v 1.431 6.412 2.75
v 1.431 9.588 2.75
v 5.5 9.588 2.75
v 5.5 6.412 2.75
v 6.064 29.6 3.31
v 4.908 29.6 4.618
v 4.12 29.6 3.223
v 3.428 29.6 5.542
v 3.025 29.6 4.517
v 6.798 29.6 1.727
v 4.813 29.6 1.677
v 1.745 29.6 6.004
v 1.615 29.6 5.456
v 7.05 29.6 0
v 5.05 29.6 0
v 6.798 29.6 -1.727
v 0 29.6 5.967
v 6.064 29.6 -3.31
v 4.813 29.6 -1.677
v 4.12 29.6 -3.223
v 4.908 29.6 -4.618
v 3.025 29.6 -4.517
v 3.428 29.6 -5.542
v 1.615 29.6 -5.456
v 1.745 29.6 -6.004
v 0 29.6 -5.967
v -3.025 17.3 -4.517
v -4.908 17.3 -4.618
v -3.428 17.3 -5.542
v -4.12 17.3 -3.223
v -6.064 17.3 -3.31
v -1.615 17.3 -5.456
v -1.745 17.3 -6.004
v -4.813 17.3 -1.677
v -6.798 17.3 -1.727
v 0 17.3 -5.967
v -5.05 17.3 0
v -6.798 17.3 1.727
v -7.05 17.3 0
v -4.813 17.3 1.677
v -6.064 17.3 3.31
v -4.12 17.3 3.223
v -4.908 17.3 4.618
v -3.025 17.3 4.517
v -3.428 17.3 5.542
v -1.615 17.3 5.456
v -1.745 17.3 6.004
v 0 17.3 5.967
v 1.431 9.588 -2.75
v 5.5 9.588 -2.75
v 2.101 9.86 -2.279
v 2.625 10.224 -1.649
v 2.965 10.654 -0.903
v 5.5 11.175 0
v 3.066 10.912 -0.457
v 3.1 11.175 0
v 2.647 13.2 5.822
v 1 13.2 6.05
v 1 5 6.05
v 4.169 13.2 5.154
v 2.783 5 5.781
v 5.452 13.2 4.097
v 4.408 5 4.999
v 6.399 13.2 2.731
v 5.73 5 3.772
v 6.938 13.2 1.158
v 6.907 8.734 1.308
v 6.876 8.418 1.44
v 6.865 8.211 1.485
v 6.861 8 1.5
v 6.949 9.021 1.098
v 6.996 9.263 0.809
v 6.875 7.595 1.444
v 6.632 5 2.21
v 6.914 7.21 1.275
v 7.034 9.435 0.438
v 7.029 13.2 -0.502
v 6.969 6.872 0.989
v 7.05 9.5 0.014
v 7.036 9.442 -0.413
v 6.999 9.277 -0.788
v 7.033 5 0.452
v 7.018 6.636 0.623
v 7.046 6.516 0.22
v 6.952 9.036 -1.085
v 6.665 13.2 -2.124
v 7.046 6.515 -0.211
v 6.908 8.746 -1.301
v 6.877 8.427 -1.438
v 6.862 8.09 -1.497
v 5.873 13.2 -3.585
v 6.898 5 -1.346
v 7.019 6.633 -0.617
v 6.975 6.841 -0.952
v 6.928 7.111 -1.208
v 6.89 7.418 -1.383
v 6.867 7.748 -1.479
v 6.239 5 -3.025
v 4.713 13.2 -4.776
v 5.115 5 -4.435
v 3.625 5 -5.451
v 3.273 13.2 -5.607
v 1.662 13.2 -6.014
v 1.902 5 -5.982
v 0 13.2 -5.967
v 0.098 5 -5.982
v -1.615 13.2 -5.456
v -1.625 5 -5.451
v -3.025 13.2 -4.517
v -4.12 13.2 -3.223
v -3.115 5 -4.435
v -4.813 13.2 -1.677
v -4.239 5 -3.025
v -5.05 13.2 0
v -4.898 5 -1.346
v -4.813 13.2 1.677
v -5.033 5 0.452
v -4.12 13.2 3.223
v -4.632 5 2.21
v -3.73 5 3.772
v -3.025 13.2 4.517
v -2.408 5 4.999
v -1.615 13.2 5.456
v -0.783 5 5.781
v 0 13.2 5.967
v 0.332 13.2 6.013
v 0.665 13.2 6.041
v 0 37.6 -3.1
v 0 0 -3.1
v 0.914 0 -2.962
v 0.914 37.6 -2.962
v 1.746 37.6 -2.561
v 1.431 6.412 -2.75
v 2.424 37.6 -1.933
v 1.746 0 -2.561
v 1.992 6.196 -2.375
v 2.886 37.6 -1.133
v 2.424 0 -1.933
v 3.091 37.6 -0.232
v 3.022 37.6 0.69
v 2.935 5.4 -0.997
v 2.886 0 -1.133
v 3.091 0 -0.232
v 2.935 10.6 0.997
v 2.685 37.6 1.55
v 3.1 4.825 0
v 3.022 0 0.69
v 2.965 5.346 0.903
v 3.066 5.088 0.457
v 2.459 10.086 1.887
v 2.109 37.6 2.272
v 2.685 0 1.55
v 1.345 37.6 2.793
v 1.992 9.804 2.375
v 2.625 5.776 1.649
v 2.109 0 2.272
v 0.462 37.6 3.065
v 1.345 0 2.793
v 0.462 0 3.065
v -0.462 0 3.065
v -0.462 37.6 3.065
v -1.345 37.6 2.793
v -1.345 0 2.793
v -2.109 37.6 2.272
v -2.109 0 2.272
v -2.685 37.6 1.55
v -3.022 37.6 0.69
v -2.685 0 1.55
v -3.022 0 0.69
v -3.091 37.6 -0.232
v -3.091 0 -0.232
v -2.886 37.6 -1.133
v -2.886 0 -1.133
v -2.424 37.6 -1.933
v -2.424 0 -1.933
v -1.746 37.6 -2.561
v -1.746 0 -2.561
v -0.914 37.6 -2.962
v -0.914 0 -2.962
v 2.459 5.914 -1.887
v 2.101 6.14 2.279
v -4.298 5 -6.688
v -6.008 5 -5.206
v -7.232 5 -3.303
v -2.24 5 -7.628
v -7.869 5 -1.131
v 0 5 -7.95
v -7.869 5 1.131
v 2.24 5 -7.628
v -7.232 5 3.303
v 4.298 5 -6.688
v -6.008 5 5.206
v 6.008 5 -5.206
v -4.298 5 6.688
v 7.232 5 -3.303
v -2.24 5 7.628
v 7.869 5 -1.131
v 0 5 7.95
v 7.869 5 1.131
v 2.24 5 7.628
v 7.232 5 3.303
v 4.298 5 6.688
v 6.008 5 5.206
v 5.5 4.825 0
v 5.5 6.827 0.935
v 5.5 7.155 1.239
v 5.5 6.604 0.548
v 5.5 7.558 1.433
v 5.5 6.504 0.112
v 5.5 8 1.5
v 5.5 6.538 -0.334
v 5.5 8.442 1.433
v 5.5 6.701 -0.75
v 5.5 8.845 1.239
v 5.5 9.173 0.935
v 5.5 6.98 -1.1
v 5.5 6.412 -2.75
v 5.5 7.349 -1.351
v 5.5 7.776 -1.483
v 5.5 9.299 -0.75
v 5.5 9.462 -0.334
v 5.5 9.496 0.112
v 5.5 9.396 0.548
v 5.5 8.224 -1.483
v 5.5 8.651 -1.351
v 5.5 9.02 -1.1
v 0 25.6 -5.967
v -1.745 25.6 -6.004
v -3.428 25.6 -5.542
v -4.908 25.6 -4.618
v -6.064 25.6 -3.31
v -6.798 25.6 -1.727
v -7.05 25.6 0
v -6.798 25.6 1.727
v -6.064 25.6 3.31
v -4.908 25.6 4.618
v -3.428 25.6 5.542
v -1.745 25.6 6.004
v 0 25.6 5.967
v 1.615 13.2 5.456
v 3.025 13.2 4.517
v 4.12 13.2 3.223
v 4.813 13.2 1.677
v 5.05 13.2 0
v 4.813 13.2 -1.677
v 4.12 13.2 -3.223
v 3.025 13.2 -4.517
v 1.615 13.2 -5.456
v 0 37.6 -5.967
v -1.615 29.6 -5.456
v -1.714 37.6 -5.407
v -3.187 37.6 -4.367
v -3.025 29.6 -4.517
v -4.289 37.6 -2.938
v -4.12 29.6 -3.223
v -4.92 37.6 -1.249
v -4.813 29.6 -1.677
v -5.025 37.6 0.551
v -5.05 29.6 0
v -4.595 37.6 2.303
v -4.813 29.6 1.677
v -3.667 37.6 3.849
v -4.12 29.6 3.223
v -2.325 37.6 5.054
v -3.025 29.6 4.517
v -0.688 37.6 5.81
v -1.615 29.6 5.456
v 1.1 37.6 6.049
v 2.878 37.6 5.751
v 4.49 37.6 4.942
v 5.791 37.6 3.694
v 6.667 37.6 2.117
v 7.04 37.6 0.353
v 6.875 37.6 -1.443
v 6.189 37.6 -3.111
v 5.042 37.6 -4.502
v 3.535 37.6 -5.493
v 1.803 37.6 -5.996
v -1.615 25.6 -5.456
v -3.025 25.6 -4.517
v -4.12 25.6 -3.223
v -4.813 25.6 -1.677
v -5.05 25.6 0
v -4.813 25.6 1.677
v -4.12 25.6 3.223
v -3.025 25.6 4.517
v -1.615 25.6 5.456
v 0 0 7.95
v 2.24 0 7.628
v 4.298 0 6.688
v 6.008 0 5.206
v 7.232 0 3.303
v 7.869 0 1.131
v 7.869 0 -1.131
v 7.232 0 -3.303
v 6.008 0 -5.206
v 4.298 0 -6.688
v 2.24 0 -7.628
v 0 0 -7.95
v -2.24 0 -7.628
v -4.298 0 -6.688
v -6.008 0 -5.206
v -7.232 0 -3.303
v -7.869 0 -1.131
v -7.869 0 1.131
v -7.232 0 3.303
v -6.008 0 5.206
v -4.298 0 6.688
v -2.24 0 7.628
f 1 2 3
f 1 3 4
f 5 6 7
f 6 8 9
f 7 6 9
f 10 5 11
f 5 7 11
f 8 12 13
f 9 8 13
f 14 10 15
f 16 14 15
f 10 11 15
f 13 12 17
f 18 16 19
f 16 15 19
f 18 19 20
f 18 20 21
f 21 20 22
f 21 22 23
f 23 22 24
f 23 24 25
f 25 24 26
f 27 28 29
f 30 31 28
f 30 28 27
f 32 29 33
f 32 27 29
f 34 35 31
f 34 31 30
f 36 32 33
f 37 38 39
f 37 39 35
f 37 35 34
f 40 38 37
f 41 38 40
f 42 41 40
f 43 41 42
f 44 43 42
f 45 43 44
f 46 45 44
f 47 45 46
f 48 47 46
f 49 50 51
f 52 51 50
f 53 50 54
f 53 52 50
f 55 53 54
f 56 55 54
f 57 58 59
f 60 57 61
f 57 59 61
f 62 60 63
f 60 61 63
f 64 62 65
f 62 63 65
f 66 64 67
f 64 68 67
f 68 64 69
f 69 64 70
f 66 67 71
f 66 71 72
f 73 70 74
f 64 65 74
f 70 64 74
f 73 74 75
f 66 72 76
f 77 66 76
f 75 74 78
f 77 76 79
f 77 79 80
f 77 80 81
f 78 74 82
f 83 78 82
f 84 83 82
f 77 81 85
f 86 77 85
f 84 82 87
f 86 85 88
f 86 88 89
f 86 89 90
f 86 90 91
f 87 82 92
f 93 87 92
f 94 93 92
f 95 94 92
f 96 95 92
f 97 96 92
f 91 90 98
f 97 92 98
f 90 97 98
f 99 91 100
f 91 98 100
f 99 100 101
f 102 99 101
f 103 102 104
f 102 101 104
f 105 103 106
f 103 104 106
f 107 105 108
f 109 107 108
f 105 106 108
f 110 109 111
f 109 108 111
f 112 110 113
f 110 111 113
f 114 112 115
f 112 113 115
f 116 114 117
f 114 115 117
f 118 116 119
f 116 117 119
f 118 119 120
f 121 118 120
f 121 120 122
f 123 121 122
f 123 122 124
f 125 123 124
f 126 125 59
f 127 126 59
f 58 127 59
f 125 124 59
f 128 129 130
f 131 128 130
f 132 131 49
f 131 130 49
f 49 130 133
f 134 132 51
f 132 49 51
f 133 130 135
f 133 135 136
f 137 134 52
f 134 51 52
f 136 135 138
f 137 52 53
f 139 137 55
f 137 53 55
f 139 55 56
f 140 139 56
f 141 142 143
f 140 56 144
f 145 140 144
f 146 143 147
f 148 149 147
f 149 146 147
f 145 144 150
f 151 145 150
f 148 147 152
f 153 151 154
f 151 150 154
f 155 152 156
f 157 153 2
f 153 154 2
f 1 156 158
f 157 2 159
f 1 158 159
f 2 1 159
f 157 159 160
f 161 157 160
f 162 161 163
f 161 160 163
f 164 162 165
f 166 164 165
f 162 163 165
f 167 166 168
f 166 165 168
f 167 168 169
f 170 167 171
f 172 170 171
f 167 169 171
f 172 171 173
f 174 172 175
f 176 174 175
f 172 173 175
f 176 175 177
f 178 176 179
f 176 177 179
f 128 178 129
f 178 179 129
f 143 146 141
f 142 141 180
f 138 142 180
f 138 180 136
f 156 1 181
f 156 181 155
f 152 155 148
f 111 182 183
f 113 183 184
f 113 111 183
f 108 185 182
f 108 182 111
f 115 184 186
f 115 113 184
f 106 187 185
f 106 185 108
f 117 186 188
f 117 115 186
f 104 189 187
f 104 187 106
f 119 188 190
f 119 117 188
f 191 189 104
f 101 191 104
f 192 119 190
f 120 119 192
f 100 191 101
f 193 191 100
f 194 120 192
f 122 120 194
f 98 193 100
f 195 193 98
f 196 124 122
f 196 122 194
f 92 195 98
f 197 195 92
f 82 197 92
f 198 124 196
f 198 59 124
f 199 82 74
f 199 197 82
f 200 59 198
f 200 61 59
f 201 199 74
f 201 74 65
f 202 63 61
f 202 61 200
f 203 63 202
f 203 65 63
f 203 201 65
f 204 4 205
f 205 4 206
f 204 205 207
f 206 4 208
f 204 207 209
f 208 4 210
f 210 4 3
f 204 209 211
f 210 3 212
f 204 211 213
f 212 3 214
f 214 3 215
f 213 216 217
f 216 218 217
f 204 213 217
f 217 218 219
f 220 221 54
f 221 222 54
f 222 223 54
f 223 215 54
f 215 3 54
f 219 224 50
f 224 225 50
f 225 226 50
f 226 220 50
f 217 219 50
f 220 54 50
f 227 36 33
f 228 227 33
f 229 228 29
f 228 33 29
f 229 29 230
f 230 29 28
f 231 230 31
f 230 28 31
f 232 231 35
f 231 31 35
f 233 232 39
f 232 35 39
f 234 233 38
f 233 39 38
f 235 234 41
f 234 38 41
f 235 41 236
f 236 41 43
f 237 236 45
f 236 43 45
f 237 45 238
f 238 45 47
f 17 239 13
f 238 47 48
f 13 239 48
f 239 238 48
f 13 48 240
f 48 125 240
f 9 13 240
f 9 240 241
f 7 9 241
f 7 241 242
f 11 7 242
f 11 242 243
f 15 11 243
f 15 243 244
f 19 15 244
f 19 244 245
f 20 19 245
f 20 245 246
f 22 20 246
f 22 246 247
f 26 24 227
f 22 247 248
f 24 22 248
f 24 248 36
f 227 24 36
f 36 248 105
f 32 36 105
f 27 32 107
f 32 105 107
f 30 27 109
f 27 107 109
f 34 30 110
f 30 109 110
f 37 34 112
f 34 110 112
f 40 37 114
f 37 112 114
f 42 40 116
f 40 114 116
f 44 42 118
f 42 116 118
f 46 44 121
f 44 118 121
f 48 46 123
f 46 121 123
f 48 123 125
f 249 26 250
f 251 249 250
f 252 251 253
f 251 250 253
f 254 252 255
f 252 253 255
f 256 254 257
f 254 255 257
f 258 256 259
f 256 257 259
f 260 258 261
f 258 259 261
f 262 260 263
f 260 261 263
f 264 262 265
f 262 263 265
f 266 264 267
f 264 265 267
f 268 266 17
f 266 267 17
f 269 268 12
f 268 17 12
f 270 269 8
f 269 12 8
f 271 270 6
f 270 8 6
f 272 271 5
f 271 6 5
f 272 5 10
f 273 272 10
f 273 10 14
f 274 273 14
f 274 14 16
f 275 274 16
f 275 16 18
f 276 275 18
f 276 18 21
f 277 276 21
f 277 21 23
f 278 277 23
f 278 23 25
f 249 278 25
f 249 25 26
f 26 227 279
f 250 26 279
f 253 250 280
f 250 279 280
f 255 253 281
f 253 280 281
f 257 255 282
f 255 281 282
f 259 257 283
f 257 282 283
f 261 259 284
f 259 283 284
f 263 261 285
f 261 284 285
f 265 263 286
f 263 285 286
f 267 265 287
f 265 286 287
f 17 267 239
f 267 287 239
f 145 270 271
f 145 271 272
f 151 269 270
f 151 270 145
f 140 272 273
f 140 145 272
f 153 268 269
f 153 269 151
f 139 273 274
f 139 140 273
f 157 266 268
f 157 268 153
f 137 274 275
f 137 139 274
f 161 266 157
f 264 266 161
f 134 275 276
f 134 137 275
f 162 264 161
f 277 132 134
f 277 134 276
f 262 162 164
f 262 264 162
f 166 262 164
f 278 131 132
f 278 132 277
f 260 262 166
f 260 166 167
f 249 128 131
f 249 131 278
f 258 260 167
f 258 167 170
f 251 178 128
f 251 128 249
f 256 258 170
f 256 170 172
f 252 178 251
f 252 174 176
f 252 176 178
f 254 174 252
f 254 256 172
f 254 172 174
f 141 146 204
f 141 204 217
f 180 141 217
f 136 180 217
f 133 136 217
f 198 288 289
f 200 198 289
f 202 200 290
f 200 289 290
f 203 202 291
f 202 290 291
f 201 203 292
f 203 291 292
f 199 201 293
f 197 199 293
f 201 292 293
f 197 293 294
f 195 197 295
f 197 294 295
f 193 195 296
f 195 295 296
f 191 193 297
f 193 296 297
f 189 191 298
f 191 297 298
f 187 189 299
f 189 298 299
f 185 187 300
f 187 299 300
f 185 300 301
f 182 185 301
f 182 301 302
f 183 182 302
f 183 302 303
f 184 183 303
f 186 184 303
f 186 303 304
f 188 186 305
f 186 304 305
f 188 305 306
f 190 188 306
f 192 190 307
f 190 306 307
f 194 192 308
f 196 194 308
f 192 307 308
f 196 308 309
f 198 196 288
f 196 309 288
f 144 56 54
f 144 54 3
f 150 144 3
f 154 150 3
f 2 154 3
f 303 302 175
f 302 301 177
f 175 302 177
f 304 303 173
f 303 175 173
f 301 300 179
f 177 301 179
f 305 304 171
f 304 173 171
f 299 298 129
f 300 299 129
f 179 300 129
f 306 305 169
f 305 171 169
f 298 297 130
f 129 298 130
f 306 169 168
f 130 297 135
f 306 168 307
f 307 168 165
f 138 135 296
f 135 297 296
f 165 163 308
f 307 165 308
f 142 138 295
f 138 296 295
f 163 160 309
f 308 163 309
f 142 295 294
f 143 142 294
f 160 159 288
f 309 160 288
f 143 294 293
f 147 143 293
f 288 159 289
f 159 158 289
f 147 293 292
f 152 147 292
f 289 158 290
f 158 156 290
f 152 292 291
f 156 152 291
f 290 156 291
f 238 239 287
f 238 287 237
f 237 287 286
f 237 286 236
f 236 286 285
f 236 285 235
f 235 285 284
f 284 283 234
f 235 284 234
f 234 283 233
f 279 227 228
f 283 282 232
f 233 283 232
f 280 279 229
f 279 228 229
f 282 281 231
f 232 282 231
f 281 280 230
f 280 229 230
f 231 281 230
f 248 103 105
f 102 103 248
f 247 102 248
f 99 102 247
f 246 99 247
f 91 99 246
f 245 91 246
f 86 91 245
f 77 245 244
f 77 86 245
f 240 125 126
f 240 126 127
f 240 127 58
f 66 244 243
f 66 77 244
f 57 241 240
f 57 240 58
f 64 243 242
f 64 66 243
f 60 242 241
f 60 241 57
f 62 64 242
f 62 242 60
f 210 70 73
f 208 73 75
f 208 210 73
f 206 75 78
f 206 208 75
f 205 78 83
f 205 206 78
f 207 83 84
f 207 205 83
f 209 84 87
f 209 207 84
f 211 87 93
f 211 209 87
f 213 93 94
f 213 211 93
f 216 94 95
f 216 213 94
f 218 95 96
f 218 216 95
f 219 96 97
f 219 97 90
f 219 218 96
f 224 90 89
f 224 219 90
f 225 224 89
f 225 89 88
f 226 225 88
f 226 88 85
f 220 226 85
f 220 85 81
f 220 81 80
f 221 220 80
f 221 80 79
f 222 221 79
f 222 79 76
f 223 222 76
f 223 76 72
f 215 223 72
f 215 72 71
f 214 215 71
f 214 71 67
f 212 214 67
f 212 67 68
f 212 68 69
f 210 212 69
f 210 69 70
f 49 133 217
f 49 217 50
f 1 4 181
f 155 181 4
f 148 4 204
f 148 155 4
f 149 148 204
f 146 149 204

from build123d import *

# Parameters (mm, degrees)
SKETCH1_R           = 7.95
BOSS_EXTRUDE1_DEPTH = 5
SKETCH2_R           = 6.05
BOSS_EXTRUDE2_DEPTH = 8.2
SKETCH3_R           = 6.05
BOSS_EXTRUDE3_DEPTH = 16.4
CUT_EXTRUDE1_DEPTH  = 4.1
SKETCH5_R           = 6.05
BOSS_EXTRUDE4_DEPTH = 8
CUT_EXTRUDE2_START  = -4
CUT_EXTRUDE2_DEPTH  = 4
SKETCH7_R           = 3.1
CUT_EXTRUDE3_DEPTH  = 40.244935979
SKETCH8_R           = 1.5
CUT_EXTRUDE4_DEPTH  = 40.244935979
SKETCH9_R           = 1.5
CUT_EXTRUDE5_DEPTH  = 5.5


with BuildPart() as part:
    # Sketch1 → Boss-Extrude1 (new body)
    with BuildSketch(Plane(origin=(0, 0, 0), x_dir=(1, 0, 0), z_dir=(0, 1, 0))):
        with Locations(Location((0, 0, 0), (0, 0, 270))):
            Circle(SKETCH1_R)
    extrude(amount=BOSS_EXTRUDE1_DEPTH)

    # Sketch2 → Boss-Extrude2 (add)
    with BuildSketch(Plane(origin=(0, 5, 0), x_dir=(1, 0, 0), z_dir=(0, 1, 0))):
        with Locations(Location((1, 0, 0), (0, 0, 270))):
            Circle(SKETCH2_R)
    extrude(amount=BOSS_EXTRUDE2_DEPTH)

    # Sketch3 → Boss-Extrude3 (add)
    with BuildSketch(Plane(origin=(0, 13.2, 0), x_dir=(1, 0, 0), z_dir=(0, 1, 0))):
        with Locations(Location((-1, 0, 0), (0, 0, 80.485961644))):
            Circle(SKETCH3_R)
    extrude(amount=BOSS_EXTRUDE3_DEPTH)

    # Sketch4 → Cut-Extrude1 (cut)
    with BuildSketch(Plane.XZ.offset(-13.2)):
        with BuildLine():
            ThreePointArc((0, 5.966783053), (-7.05, 0), (0, -5.966783053))
            ThreePointArc((0, -5.966783053), (-5.05, 0), (0, 5.966783053))
        make_face()
    extrude(amount=-CUT_EXTRUDE1_DEPTH, mode=Mode.SUBTRACT)

    # Sketch5 → Boss-Extrude4 (add)
    with BuildSketch(Plane(origin=(0, 29.6, 0), x_dir=(1, 0, 0), z_dir=(0, 1, 0))):
        with Locations(Location((1, 0, 0), (0, 0, 99.514038356))):
            Circle(SKETCH5_R)
    extrude(amount=BOSS_EXTRUDE4_DEPTH)

    # Sketch6 → Cut-Extrude2 (cut)
    with BuildSketch(Plane(origin=(0, 29.6, 0), x_dir=(1, 0, 0), z_dir=(0, 1, 0)).offset(CUT_EXTRUDE2_START)):
        with BuildLine():
            ThreePointArc((0, 5.966783053), (-5.05, 0), (0, -5.966783053))
            ThreePointArc((0, -5.966783053), (-7.05, 0), (0, 5.966783053))
        make_face()
    extrude(amount=CUT_EXTRUDE2_DEPTH, mode=Mode.SUBTRACT)

    # Sketch7 → Cut-Extrude3 (cut, through all)
    with BuildSketch(Plane.XZ):
        with Locations(Location((0, 0, 0), (0, 0, 270))):
            Circle(SKETCH7_R)
    extrude(amount=-CUT_EXTRUDE3_DEPTH, mode=Mode.SUBTRACT)

    # Sketch8 → Cut-Extrude4 (cut, through all)
    with BuildSketch(Plane(origin=(0, 0, 0), x_dir=(0, 0, -1), z_dir=(1, 0, 0))):
        with Locations(Location((0, 8, 0), (0, 0, 180))):
            Circle(SKETCH8_R)
    extrude(amount=CUT_EXTRUDE4_DEPTH, mode=Mode.SUBTRACT)

    # Sketch9 → Cut-Extrude5 (cut)
    with BuildSketch(Plane(origin=(0, 0, 0), x_dir=(0, 0, -1), z_dir=(1, 0, 0))):
        Polygon((0, 11.175426481), (-2.75, 9.58771324), (-2.75, 6.41228676), (0, 4.824573519), (2.75, 6.41228676), (2.75, 9.58771324), align=None)
        with Locations(Location((0, 8, 0), (0, 0, 180))):
            Circle(SKETCH9_R, mode=Mode.SUBTRACT)
    extrude(amount=CUT_EXTRUDE5_DEPTH, mode=Mode.SUBTRACT)


solid = part.part
